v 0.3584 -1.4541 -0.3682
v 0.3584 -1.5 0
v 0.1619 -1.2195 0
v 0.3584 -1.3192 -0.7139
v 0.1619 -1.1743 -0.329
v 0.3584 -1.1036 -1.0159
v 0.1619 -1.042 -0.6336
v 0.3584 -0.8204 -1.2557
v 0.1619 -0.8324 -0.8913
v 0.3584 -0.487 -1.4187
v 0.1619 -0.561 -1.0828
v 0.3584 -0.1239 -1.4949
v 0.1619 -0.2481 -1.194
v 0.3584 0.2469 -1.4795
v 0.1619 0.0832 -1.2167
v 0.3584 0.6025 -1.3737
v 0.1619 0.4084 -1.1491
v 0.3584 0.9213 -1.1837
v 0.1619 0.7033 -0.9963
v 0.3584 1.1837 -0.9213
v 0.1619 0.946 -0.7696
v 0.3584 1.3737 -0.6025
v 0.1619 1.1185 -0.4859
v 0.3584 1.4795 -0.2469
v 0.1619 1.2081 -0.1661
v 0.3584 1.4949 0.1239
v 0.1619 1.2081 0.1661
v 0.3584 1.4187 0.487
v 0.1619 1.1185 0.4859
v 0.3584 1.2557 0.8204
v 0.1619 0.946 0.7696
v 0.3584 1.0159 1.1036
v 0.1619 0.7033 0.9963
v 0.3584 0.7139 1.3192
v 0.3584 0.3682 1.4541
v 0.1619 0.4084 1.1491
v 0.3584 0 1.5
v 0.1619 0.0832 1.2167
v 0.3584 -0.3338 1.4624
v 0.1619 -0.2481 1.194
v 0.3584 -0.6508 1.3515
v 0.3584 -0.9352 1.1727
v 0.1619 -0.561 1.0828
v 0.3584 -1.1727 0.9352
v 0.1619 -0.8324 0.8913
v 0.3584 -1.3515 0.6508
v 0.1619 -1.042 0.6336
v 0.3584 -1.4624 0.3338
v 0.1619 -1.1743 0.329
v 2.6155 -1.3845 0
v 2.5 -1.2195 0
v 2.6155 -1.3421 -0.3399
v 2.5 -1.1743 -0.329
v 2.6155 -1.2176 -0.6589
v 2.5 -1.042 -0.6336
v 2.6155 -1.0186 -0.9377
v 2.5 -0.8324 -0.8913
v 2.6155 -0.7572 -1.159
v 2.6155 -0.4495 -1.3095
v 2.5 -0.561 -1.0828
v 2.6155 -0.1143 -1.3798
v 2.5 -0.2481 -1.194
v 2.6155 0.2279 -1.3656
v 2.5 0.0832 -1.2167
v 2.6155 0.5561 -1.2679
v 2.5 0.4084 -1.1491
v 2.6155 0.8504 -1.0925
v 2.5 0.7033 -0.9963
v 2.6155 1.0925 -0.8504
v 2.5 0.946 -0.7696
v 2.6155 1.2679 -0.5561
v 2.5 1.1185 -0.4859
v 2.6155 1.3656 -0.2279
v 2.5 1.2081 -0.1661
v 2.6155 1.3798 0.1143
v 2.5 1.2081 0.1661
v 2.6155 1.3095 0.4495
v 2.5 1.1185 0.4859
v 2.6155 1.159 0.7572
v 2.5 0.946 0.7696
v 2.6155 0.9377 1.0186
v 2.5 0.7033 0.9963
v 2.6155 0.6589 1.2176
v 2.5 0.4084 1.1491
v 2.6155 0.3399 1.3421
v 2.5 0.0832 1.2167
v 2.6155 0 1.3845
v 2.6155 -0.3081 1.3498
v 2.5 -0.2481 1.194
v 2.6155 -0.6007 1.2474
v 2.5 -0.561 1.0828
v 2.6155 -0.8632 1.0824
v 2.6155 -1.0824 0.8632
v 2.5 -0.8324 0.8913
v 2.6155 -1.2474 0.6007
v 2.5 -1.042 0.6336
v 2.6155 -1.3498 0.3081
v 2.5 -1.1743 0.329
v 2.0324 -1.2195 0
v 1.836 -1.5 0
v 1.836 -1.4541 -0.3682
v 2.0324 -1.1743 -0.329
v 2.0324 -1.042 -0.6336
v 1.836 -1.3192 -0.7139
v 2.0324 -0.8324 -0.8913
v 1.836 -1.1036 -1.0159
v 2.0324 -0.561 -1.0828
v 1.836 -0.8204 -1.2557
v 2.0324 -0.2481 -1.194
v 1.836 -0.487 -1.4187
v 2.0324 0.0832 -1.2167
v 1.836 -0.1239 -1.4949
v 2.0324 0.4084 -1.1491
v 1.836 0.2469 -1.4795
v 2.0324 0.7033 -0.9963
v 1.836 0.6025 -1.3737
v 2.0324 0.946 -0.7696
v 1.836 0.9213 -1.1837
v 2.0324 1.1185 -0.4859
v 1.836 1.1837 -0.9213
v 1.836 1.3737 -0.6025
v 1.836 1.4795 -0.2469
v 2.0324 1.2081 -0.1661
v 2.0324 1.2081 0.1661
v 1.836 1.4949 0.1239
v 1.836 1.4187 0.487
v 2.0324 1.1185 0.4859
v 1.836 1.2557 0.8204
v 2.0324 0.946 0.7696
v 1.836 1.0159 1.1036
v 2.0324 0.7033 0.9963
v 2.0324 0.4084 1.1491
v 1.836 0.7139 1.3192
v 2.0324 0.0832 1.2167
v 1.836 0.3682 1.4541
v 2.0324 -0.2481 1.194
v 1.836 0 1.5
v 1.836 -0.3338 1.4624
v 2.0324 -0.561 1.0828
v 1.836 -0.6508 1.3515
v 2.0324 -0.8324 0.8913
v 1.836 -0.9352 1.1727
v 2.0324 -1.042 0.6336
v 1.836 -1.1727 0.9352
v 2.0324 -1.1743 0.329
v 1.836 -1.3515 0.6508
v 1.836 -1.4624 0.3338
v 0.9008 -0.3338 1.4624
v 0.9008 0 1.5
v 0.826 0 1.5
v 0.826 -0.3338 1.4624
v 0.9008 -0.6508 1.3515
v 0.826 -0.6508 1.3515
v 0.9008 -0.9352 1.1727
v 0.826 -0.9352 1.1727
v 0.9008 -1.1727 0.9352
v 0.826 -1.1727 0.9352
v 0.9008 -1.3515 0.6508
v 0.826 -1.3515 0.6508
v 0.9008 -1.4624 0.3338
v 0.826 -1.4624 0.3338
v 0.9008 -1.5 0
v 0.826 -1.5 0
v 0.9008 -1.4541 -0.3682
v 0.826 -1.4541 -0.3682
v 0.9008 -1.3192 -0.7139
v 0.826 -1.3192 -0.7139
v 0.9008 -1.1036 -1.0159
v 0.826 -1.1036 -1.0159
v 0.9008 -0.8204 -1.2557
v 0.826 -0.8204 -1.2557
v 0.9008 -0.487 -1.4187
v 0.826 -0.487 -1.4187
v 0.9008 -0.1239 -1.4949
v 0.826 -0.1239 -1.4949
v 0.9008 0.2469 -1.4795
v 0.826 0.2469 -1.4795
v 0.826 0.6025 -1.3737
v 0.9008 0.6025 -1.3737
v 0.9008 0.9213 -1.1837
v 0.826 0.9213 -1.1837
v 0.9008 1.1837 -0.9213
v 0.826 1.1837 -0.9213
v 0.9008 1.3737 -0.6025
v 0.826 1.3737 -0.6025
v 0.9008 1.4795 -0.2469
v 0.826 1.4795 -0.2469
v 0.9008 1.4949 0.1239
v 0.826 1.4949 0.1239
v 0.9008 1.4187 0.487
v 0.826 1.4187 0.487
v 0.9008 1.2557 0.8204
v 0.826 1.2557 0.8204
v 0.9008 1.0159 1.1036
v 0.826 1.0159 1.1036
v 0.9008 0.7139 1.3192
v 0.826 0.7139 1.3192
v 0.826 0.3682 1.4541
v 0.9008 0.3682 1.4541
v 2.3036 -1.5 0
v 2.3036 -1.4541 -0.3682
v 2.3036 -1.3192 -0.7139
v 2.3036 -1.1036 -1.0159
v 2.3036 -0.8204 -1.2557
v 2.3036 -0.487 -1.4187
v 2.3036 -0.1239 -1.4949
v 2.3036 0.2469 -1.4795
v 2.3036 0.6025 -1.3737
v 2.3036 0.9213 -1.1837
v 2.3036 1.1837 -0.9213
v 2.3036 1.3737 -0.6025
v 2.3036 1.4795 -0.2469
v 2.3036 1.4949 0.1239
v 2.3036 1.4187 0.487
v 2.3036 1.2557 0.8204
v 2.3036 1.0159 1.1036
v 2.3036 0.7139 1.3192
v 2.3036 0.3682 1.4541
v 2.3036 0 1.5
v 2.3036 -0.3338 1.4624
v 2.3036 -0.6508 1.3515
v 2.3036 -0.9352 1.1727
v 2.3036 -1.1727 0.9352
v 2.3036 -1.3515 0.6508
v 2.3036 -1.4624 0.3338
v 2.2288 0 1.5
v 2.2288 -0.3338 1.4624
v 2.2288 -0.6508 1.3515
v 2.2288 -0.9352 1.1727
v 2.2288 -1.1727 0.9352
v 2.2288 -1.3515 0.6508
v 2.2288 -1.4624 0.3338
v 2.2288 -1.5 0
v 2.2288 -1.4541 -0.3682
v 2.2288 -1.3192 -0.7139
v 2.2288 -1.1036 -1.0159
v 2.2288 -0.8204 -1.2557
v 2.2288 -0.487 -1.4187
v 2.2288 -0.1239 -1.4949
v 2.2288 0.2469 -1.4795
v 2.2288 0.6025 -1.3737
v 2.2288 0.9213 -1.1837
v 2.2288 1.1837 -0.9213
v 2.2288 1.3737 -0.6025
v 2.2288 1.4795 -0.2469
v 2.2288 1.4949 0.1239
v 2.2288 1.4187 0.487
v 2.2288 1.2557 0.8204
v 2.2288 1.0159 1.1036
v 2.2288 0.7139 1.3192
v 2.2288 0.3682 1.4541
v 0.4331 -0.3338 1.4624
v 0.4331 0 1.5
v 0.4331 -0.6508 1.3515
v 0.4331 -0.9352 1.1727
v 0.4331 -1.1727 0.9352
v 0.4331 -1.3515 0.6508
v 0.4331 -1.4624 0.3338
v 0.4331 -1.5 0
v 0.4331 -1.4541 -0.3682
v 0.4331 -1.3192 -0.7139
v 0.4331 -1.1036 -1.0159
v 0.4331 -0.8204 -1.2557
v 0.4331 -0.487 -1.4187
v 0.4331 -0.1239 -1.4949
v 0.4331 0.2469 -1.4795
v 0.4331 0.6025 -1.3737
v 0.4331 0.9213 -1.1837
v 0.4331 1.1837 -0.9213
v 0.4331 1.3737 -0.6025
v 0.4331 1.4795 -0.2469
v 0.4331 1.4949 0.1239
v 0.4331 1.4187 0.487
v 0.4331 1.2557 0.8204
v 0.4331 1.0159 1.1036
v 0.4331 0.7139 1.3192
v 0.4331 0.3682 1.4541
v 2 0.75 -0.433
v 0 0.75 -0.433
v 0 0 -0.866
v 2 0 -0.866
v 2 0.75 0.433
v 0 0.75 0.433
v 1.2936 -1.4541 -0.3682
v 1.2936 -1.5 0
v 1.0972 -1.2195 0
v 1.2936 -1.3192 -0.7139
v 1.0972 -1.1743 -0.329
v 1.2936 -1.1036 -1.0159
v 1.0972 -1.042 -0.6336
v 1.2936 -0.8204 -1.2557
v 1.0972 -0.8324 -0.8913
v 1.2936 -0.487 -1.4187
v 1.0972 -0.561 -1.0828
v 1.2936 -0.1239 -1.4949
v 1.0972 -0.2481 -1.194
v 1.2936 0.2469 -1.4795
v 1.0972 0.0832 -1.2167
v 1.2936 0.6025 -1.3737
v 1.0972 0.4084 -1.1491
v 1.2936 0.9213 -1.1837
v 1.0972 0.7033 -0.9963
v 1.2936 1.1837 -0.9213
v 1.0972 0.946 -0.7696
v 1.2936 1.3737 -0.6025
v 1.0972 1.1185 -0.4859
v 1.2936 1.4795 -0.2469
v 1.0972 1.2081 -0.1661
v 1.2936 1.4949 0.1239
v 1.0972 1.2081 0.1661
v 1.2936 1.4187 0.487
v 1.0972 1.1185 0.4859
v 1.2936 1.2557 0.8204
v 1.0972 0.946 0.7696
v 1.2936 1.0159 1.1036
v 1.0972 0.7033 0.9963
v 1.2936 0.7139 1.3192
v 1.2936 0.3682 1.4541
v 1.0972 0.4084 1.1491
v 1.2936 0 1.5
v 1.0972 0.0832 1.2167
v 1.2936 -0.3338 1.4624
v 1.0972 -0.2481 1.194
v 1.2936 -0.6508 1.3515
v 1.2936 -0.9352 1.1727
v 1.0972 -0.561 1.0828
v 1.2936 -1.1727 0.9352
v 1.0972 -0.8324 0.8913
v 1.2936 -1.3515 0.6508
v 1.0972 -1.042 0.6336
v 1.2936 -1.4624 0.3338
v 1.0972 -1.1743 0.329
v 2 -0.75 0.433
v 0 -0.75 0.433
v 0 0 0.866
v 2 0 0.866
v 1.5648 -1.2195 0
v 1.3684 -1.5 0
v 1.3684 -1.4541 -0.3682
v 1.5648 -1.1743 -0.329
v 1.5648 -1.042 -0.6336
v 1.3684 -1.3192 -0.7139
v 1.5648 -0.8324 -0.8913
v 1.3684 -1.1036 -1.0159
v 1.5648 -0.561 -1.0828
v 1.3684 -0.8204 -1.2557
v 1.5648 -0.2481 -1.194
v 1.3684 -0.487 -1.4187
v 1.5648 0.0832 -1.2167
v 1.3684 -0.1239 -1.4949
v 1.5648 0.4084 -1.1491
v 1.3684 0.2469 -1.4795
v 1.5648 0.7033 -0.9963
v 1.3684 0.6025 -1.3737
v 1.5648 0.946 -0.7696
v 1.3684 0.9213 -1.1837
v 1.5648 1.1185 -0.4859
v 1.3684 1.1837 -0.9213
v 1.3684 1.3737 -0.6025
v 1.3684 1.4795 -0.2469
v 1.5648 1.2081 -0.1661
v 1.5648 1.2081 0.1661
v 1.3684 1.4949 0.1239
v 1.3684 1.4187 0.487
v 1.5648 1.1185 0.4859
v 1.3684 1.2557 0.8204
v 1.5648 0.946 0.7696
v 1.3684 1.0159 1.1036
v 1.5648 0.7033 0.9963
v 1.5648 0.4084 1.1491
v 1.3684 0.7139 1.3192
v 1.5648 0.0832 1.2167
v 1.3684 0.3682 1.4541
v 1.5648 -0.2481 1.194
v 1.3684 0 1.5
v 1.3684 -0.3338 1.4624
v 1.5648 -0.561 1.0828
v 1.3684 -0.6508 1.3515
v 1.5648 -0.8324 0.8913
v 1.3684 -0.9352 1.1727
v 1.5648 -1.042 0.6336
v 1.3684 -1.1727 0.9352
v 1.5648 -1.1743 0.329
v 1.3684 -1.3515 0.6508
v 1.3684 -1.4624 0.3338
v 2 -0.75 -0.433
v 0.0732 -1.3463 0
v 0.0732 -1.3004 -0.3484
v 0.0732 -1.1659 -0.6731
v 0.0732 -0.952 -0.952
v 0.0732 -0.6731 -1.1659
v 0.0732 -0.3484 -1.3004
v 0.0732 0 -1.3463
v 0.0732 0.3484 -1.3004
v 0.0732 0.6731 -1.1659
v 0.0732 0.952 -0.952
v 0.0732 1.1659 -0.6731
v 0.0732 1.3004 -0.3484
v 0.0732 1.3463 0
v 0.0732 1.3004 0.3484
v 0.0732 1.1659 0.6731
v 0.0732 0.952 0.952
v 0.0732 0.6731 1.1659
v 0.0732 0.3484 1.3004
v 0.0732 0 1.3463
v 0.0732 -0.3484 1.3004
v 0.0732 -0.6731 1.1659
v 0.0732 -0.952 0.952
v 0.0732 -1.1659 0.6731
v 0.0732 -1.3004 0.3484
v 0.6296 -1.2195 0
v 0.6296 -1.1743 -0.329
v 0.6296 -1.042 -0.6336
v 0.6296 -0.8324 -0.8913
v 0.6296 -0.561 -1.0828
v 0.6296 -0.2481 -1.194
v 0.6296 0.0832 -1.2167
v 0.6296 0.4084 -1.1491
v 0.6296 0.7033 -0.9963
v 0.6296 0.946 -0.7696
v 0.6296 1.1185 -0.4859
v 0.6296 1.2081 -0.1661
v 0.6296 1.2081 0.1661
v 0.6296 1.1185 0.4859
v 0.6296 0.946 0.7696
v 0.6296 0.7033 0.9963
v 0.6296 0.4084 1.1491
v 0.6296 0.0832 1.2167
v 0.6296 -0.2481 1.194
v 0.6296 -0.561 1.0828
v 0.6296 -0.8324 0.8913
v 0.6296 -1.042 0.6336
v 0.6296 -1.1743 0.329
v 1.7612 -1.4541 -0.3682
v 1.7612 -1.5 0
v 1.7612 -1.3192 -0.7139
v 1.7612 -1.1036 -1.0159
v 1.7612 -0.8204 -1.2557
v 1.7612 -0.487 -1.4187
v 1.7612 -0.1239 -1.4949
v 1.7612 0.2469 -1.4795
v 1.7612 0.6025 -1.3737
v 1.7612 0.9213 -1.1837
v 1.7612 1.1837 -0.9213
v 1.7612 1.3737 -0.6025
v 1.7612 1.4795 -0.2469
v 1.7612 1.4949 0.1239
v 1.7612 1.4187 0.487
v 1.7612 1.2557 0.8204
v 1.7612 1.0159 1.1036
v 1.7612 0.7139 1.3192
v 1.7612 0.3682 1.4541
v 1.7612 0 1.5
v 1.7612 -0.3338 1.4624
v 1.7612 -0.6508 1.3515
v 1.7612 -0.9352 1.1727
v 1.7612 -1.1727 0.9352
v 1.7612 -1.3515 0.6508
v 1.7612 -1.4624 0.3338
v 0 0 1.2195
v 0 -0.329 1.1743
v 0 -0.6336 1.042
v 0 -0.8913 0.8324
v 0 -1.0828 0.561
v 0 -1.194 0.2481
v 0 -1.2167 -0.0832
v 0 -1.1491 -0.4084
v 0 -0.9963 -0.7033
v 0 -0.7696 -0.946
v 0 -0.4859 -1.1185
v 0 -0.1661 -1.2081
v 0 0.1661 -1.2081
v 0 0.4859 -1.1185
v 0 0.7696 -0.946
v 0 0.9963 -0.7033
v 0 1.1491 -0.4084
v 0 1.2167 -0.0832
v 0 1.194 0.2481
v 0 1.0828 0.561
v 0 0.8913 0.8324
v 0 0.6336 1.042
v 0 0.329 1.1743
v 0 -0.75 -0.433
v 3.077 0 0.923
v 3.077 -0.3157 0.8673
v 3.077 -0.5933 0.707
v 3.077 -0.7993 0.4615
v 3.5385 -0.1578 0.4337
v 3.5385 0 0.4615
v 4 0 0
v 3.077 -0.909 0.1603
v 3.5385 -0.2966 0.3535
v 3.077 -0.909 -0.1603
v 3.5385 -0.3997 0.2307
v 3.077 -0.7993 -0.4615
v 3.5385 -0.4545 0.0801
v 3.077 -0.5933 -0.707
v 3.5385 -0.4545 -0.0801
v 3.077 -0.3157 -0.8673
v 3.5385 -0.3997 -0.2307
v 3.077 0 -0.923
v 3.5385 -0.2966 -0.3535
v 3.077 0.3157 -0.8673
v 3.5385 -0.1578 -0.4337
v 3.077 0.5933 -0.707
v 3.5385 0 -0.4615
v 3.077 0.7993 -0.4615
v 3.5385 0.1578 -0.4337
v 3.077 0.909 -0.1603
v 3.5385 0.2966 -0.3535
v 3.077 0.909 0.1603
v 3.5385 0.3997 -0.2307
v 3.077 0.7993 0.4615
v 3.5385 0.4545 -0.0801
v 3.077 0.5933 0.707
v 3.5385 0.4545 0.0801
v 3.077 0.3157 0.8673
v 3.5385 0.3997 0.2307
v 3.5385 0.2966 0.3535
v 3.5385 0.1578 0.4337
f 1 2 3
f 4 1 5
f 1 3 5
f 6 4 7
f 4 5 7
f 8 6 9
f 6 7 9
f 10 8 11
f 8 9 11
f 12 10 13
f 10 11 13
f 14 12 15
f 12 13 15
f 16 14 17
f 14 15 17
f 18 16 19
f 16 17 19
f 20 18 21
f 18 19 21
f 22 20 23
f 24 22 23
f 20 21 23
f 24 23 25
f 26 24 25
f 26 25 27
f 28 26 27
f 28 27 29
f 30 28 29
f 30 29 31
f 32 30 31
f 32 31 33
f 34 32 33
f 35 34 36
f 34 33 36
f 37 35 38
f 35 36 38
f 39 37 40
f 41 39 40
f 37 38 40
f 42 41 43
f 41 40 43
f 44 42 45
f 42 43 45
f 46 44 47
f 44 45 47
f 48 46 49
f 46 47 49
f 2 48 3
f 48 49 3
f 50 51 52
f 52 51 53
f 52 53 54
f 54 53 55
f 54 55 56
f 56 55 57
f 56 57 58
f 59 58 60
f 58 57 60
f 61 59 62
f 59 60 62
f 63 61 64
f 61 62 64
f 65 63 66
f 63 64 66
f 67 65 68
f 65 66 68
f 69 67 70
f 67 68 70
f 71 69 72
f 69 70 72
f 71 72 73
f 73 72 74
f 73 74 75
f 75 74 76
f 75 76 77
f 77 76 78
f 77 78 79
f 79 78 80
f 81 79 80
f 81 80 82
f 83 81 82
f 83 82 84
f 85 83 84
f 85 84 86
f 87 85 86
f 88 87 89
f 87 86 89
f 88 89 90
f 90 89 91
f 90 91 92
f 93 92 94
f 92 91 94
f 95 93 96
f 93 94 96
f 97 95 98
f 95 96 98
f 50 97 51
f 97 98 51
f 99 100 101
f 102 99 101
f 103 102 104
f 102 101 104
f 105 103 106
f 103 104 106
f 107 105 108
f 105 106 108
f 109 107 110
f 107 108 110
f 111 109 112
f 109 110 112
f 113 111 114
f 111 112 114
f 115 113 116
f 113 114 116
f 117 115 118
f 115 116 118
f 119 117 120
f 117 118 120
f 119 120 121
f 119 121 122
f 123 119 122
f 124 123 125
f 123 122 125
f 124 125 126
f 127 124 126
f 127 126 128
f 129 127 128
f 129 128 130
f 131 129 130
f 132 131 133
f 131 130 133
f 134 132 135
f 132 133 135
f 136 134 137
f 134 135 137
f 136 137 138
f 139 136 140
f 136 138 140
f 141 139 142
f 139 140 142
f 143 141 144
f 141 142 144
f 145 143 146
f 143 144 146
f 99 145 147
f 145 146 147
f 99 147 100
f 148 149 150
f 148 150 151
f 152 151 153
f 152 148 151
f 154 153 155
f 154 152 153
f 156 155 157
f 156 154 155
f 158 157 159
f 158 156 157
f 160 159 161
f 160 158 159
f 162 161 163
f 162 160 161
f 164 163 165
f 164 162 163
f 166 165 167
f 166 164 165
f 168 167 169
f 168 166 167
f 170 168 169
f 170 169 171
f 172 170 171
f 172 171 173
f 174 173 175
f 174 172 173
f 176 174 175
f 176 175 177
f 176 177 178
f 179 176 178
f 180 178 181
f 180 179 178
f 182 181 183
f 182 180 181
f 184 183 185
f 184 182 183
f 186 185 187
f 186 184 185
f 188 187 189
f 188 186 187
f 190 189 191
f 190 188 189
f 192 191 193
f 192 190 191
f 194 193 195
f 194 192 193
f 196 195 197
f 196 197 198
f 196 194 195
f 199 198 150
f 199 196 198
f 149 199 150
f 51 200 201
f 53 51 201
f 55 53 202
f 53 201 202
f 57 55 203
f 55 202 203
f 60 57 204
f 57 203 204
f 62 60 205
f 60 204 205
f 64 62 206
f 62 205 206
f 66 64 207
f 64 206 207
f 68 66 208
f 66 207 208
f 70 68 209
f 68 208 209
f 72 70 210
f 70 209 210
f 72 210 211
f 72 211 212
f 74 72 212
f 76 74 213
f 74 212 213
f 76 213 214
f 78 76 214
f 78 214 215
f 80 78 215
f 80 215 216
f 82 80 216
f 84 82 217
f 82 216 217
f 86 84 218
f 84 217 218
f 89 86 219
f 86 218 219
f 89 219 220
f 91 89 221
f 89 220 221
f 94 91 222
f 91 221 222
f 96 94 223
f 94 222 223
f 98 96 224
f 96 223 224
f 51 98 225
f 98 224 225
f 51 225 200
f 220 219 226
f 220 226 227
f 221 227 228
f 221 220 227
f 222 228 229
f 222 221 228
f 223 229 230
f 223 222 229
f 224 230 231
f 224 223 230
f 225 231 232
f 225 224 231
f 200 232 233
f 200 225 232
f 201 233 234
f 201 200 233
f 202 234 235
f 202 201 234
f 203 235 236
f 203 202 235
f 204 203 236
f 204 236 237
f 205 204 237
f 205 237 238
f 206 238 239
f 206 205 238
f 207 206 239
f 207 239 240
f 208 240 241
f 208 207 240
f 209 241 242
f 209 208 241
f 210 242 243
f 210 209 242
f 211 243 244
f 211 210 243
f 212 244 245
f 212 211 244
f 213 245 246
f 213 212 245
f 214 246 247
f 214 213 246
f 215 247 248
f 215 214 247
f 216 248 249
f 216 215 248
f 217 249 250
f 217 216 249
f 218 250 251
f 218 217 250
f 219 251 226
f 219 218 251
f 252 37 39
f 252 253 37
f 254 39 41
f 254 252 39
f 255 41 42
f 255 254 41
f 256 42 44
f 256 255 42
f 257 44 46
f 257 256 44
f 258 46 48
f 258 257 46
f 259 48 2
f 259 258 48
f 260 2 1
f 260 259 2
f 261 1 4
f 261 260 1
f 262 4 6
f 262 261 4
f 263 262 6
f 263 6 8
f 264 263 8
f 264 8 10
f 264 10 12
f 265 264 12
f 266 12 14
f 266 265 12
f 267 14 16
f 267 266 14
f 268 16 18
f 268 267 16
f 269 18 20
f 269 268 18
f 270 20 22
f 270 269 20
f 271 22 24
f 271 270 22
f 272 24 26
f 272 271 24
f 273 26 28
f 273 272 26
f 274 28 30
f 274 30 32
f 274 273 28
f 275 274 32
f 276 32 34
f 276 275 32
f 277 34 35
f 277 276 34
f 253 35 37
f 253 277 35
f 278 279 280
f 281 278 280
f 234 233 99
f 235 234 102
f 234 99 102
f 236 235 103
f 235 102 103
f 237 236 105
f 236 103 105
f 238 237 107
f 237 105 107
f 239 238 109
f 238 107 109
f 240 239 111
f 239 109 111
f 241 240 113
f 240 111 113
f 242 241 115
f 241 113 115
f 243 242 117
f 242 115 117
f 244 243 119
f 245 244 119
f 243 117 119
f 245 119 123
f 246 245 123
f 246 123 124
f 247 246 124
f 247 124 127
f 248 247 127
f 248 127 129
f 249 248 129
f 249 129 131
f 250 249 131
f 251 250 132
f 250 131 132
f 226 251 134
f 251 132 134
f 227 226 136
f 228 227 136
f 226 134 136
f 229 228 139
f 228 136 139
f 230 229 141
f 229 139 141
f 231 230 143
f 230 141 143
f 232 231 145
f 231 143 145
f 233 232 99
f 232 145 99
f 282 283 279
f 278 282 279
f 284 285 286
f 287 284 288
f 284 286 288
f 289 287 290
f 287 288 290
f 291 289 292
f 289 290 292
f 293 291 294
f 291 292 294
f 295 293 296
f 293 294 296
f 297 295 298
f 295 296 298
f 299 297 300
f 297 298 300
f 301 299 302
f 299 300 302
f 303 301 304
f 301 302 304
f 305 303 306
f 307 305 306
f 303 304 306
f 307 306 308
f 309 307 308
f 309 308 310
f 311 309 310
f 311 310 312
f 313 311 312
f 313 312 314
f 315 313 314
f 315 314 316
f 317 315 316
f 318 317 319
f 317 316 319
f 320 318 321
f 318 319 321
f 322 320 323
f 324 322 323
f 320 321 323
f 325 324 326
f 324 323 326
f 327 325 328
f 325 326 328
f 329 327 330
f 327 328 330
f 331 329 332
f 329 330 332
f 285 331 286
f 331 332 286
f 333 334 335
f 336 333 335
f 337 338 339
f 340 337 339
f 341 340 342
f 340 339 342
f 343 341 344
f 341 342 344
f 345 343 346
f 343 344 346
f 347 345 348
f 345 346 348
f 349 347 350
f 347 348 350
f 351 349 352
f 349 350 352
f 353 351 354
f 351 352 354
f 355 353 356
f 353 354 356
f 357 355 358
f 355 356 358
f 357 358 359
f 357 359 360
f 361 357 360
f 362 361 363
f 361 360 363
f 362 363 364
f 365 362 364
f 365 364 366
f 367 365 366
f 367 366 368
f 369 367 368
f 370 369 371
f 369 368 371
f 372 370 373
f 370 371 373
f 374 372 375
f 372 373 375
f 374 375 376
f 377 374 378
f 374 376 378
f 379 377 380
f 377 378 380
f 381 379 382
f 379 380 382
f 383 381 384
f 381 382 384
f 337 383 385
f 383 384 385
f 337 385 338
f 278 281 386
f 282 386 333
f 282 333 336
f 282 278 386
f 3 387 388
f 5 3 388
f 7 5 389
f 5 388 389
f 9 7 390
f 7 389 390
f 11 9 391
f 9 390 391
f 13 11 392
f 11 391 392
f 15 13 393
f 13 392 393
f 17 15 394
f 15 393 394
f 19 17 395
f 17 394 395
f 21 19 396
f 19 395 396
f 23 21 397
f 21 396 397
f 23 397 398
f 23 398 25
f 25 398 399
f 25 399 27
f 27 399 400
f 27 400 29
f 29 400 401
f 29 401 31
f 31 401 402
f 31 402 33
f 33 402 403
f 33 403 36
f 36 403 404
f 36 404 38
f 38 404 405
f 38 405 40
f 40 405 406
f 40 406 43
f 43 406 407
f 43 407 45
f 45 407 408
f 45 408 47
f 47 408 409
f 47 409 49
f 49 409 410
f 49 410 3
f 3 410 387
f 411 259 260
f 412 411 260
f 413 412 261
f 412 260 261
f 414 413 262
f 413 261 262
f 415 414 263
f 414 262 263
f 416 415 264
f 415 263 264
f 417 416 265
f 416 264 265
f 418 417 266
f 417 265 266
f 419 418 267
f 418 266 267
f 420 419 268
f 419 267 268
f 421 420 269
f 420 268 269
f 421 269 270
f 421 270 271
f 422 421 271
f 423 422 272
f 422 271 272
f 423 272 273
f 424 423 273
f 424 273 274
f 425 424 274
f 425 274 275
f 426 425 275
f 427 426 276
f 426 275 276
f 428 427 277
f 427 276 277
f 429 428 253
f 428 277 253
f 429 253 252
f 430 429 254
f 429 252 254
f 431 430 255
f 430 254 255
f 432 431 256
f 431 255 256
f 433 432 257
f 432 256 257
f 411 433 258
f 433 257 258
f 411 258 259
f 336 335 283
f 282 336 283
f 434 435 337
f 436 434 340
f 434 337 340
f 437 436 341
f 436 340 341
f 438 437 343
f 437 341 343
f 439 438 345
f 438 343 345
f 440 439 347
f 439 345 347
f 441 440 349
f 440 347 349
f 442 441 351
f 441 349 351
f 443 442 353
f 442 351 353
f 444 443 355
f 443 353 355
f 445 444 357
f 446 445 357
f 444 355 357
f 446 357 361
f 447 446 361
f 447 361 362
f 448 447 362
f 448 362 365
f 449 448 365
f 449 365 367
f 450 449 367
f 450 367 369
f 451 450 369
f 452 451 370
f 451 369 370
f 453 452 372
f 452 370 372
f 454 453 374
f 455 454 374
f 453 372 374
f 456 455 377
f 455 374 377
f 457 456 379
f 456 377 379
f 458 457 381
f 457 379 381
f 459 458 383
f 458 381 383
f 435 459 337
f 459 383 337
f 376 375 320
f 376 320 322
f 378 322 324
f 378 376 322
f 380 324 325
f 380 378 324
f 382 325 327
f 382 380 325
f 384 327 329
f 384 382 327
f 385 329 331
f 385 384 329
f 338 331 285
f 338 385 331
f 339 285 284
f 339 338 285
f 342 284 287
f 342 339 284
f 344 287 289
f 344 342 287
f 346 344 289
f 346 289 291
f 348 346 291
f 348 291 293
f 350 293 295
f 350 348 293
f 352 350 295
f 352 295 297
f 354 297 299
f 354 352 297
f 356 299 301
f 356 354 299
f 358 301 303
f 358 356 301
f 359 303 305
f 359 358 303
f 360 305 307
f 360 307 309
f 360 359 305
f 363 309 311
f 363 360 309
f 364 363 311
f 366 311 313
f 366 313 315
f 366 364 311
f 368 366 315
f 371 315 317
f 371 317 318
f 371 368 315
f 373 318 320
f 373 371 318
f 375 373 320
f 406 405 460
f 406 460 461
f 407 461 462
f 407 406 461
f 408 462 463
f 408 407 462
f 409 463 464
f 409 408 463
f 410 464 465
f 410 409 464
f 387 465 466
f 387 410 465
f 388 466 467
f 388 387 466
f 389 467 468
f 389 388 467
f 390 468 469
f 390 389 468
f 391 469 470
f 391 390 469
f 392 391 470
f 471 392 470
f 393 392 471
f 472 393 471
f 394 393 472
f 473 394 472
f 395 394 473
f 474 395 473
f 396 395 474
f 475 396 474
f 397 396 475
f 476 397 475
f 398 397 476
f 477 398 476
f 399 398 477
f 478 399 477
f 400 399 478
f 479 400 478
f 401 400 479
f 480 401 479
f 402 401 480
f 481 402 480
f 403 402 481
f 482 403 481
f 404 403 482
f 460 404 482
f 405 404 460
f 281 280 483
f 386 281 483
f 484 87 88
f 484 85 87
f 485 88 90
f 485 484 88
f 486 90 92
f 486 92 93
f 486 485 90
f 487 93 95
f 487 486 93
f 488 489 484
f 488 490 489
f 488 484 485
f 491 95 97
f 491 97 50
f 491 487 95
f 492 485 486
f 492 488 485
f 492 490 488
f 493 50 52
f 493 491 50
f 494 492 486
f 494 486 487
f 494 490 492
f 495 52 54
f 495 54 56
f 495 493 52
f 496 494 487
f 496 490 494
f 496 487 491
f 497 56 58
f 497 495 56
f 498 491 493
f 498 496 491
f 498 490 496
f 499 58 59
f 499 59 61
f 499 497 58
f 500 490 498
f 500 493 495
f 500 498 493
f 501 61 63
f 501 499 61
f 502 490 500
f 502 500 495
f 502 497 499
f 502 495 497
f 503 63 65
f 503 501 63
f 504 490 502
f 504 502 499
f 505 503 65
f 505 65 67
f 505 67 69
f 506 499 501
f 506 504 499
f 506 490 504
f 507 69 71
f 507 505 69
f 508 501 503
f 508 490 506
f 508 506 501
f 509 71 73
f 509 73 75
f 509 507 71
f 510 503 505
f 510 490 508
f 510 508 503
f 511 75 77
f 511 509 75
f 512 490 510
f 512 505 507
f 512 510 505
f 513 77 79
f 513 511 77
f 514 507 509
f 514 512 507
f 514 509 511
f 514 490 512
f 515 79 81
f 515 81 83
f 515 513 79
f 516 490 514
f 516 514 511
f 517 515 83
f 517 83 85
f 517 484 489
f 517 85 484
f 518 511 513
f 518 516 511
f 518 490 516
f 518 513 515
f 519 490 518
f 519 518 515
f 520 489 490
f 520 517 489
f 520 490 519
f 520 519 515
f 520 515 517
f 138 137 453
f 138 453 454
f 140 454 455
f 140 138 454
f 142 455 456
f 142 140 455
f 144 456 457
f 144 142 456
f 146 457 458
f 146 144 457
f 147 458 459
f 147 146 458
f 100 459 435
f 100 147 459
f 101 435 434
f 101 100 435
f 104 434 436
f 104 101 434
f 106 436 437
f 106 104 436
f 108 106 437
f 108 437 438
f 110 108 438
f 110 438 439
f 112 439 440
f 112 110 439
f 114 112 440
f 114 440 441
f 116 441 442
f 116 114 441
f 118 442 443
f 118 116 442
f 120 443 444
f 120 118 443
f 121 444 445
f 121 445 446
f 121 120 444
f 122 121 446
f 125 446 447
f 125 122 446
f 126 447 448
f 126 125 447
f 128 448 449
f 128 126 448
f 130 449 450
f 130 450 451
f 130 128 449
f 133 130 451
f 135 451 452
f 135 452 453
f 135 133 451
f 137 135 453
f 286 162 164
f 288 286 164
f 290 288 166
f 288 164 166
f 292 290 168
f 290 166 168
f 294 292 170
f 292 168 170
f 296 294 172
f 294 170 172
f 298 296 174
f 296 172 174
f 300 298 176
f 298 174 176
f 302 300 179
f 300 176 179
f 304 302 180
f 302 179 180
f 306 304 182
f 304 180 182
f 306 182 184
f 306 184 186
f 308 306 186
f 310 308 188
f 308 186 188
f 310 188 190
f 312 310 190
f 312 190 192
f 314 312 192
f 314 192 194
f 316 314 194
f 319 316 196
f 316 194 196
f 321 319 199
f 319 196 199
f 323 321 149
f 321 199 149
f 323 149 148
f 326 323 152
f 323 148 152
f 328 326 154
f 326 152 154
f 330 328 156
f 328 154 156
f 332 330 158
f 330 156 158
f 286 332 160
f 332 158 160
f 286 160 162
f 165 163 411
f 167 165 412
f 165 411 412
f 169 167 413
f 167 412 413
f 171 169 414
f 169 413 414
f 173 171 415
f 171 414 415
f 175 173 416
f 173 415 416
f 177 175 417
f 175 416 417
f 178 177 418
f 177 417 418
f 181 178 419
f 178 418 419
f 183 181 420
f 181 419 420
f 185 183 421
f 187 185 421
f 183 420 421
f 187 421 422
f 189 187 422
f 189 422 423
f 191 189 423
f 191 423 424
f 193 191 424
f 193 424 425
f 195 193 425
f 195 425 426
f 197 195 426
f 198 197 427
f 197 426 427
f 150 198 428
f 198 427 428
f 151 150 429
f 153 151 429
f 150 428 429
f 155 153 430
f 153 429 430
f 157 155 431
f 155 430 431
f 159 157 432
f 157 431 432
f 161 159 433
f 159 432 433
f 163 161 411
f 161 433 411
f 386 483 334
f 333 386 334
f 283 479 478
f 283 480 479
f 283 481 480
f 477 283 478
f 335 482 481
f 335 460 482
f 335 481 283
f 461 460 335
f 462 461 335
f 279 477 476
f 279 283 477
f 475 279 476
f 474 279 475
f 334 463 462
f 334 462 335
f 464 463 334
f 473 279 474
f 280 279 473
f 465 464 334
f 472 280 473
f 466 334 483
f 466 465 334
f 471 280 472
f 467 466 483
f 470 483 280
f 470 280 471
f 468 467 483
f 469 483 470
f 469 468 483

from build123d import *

# Parameters (mm, degrees)
HEX_2_DEPTH     = 2
THDSCHPAT_COUNT = 6
THDSCHPAT_PITCH = 0.467610841


with BuildPart() as part:
    # BodySke → BaseBody (revolve)
    with BuildSketch(Plane.XY, mode=Mode.PRIVATE) as basebody_sk:
        Polygon((0, 0), (0, 1.2195), (0.161946751, 1.5), (2.5, 1.5), (4, 0), align=None)
    revolve(basebody_sk.sketch.rotate(Axis((-12.7, 0, 0), (1, 0, 0)), 90), axis=Axis((-12.7, 0, 0), (1, 0, 0)))

    # Sketch2 → Hex 2 (cut)
    with BuildSketch(Plane.ZY):
        Polygon((0.433012702, 0.75), (-0.433012702, 0.75), (-0.866025404, 0), (-0.433012702, -0.75), (0.433012702, -0.75), (0.866025404, 0), align=None)
    extrude(amount=-HEX_2_DEPTH, mode=Mode.SUBTRACT)

    # ThdSchSke → ThreadSchematic (revolve, cut)
    with BuildSketch(Plane.XY):
        Polygon((0.161946751, -1.2195), (-0.034461464, -1.5), (-0.034461464, -1.875), (0.358354965, -1.875), (0.358354965, -1.5), align=None)
    threadschematic = revolve(axis=Axis((-3.175, 0, 0), (1, 0, 0)), mode=Mode.SUBTRACT)

    # ThdSchPat: ThreadSchematic ×6
    with Locations(*[(i * THDSCHPAT_PITCH, 0, 0) for i in range(1, THDSCHPAT_COUNT)]):
        add(threadschematic, mode=Mode.SUBTRACT)


solid = part.part
